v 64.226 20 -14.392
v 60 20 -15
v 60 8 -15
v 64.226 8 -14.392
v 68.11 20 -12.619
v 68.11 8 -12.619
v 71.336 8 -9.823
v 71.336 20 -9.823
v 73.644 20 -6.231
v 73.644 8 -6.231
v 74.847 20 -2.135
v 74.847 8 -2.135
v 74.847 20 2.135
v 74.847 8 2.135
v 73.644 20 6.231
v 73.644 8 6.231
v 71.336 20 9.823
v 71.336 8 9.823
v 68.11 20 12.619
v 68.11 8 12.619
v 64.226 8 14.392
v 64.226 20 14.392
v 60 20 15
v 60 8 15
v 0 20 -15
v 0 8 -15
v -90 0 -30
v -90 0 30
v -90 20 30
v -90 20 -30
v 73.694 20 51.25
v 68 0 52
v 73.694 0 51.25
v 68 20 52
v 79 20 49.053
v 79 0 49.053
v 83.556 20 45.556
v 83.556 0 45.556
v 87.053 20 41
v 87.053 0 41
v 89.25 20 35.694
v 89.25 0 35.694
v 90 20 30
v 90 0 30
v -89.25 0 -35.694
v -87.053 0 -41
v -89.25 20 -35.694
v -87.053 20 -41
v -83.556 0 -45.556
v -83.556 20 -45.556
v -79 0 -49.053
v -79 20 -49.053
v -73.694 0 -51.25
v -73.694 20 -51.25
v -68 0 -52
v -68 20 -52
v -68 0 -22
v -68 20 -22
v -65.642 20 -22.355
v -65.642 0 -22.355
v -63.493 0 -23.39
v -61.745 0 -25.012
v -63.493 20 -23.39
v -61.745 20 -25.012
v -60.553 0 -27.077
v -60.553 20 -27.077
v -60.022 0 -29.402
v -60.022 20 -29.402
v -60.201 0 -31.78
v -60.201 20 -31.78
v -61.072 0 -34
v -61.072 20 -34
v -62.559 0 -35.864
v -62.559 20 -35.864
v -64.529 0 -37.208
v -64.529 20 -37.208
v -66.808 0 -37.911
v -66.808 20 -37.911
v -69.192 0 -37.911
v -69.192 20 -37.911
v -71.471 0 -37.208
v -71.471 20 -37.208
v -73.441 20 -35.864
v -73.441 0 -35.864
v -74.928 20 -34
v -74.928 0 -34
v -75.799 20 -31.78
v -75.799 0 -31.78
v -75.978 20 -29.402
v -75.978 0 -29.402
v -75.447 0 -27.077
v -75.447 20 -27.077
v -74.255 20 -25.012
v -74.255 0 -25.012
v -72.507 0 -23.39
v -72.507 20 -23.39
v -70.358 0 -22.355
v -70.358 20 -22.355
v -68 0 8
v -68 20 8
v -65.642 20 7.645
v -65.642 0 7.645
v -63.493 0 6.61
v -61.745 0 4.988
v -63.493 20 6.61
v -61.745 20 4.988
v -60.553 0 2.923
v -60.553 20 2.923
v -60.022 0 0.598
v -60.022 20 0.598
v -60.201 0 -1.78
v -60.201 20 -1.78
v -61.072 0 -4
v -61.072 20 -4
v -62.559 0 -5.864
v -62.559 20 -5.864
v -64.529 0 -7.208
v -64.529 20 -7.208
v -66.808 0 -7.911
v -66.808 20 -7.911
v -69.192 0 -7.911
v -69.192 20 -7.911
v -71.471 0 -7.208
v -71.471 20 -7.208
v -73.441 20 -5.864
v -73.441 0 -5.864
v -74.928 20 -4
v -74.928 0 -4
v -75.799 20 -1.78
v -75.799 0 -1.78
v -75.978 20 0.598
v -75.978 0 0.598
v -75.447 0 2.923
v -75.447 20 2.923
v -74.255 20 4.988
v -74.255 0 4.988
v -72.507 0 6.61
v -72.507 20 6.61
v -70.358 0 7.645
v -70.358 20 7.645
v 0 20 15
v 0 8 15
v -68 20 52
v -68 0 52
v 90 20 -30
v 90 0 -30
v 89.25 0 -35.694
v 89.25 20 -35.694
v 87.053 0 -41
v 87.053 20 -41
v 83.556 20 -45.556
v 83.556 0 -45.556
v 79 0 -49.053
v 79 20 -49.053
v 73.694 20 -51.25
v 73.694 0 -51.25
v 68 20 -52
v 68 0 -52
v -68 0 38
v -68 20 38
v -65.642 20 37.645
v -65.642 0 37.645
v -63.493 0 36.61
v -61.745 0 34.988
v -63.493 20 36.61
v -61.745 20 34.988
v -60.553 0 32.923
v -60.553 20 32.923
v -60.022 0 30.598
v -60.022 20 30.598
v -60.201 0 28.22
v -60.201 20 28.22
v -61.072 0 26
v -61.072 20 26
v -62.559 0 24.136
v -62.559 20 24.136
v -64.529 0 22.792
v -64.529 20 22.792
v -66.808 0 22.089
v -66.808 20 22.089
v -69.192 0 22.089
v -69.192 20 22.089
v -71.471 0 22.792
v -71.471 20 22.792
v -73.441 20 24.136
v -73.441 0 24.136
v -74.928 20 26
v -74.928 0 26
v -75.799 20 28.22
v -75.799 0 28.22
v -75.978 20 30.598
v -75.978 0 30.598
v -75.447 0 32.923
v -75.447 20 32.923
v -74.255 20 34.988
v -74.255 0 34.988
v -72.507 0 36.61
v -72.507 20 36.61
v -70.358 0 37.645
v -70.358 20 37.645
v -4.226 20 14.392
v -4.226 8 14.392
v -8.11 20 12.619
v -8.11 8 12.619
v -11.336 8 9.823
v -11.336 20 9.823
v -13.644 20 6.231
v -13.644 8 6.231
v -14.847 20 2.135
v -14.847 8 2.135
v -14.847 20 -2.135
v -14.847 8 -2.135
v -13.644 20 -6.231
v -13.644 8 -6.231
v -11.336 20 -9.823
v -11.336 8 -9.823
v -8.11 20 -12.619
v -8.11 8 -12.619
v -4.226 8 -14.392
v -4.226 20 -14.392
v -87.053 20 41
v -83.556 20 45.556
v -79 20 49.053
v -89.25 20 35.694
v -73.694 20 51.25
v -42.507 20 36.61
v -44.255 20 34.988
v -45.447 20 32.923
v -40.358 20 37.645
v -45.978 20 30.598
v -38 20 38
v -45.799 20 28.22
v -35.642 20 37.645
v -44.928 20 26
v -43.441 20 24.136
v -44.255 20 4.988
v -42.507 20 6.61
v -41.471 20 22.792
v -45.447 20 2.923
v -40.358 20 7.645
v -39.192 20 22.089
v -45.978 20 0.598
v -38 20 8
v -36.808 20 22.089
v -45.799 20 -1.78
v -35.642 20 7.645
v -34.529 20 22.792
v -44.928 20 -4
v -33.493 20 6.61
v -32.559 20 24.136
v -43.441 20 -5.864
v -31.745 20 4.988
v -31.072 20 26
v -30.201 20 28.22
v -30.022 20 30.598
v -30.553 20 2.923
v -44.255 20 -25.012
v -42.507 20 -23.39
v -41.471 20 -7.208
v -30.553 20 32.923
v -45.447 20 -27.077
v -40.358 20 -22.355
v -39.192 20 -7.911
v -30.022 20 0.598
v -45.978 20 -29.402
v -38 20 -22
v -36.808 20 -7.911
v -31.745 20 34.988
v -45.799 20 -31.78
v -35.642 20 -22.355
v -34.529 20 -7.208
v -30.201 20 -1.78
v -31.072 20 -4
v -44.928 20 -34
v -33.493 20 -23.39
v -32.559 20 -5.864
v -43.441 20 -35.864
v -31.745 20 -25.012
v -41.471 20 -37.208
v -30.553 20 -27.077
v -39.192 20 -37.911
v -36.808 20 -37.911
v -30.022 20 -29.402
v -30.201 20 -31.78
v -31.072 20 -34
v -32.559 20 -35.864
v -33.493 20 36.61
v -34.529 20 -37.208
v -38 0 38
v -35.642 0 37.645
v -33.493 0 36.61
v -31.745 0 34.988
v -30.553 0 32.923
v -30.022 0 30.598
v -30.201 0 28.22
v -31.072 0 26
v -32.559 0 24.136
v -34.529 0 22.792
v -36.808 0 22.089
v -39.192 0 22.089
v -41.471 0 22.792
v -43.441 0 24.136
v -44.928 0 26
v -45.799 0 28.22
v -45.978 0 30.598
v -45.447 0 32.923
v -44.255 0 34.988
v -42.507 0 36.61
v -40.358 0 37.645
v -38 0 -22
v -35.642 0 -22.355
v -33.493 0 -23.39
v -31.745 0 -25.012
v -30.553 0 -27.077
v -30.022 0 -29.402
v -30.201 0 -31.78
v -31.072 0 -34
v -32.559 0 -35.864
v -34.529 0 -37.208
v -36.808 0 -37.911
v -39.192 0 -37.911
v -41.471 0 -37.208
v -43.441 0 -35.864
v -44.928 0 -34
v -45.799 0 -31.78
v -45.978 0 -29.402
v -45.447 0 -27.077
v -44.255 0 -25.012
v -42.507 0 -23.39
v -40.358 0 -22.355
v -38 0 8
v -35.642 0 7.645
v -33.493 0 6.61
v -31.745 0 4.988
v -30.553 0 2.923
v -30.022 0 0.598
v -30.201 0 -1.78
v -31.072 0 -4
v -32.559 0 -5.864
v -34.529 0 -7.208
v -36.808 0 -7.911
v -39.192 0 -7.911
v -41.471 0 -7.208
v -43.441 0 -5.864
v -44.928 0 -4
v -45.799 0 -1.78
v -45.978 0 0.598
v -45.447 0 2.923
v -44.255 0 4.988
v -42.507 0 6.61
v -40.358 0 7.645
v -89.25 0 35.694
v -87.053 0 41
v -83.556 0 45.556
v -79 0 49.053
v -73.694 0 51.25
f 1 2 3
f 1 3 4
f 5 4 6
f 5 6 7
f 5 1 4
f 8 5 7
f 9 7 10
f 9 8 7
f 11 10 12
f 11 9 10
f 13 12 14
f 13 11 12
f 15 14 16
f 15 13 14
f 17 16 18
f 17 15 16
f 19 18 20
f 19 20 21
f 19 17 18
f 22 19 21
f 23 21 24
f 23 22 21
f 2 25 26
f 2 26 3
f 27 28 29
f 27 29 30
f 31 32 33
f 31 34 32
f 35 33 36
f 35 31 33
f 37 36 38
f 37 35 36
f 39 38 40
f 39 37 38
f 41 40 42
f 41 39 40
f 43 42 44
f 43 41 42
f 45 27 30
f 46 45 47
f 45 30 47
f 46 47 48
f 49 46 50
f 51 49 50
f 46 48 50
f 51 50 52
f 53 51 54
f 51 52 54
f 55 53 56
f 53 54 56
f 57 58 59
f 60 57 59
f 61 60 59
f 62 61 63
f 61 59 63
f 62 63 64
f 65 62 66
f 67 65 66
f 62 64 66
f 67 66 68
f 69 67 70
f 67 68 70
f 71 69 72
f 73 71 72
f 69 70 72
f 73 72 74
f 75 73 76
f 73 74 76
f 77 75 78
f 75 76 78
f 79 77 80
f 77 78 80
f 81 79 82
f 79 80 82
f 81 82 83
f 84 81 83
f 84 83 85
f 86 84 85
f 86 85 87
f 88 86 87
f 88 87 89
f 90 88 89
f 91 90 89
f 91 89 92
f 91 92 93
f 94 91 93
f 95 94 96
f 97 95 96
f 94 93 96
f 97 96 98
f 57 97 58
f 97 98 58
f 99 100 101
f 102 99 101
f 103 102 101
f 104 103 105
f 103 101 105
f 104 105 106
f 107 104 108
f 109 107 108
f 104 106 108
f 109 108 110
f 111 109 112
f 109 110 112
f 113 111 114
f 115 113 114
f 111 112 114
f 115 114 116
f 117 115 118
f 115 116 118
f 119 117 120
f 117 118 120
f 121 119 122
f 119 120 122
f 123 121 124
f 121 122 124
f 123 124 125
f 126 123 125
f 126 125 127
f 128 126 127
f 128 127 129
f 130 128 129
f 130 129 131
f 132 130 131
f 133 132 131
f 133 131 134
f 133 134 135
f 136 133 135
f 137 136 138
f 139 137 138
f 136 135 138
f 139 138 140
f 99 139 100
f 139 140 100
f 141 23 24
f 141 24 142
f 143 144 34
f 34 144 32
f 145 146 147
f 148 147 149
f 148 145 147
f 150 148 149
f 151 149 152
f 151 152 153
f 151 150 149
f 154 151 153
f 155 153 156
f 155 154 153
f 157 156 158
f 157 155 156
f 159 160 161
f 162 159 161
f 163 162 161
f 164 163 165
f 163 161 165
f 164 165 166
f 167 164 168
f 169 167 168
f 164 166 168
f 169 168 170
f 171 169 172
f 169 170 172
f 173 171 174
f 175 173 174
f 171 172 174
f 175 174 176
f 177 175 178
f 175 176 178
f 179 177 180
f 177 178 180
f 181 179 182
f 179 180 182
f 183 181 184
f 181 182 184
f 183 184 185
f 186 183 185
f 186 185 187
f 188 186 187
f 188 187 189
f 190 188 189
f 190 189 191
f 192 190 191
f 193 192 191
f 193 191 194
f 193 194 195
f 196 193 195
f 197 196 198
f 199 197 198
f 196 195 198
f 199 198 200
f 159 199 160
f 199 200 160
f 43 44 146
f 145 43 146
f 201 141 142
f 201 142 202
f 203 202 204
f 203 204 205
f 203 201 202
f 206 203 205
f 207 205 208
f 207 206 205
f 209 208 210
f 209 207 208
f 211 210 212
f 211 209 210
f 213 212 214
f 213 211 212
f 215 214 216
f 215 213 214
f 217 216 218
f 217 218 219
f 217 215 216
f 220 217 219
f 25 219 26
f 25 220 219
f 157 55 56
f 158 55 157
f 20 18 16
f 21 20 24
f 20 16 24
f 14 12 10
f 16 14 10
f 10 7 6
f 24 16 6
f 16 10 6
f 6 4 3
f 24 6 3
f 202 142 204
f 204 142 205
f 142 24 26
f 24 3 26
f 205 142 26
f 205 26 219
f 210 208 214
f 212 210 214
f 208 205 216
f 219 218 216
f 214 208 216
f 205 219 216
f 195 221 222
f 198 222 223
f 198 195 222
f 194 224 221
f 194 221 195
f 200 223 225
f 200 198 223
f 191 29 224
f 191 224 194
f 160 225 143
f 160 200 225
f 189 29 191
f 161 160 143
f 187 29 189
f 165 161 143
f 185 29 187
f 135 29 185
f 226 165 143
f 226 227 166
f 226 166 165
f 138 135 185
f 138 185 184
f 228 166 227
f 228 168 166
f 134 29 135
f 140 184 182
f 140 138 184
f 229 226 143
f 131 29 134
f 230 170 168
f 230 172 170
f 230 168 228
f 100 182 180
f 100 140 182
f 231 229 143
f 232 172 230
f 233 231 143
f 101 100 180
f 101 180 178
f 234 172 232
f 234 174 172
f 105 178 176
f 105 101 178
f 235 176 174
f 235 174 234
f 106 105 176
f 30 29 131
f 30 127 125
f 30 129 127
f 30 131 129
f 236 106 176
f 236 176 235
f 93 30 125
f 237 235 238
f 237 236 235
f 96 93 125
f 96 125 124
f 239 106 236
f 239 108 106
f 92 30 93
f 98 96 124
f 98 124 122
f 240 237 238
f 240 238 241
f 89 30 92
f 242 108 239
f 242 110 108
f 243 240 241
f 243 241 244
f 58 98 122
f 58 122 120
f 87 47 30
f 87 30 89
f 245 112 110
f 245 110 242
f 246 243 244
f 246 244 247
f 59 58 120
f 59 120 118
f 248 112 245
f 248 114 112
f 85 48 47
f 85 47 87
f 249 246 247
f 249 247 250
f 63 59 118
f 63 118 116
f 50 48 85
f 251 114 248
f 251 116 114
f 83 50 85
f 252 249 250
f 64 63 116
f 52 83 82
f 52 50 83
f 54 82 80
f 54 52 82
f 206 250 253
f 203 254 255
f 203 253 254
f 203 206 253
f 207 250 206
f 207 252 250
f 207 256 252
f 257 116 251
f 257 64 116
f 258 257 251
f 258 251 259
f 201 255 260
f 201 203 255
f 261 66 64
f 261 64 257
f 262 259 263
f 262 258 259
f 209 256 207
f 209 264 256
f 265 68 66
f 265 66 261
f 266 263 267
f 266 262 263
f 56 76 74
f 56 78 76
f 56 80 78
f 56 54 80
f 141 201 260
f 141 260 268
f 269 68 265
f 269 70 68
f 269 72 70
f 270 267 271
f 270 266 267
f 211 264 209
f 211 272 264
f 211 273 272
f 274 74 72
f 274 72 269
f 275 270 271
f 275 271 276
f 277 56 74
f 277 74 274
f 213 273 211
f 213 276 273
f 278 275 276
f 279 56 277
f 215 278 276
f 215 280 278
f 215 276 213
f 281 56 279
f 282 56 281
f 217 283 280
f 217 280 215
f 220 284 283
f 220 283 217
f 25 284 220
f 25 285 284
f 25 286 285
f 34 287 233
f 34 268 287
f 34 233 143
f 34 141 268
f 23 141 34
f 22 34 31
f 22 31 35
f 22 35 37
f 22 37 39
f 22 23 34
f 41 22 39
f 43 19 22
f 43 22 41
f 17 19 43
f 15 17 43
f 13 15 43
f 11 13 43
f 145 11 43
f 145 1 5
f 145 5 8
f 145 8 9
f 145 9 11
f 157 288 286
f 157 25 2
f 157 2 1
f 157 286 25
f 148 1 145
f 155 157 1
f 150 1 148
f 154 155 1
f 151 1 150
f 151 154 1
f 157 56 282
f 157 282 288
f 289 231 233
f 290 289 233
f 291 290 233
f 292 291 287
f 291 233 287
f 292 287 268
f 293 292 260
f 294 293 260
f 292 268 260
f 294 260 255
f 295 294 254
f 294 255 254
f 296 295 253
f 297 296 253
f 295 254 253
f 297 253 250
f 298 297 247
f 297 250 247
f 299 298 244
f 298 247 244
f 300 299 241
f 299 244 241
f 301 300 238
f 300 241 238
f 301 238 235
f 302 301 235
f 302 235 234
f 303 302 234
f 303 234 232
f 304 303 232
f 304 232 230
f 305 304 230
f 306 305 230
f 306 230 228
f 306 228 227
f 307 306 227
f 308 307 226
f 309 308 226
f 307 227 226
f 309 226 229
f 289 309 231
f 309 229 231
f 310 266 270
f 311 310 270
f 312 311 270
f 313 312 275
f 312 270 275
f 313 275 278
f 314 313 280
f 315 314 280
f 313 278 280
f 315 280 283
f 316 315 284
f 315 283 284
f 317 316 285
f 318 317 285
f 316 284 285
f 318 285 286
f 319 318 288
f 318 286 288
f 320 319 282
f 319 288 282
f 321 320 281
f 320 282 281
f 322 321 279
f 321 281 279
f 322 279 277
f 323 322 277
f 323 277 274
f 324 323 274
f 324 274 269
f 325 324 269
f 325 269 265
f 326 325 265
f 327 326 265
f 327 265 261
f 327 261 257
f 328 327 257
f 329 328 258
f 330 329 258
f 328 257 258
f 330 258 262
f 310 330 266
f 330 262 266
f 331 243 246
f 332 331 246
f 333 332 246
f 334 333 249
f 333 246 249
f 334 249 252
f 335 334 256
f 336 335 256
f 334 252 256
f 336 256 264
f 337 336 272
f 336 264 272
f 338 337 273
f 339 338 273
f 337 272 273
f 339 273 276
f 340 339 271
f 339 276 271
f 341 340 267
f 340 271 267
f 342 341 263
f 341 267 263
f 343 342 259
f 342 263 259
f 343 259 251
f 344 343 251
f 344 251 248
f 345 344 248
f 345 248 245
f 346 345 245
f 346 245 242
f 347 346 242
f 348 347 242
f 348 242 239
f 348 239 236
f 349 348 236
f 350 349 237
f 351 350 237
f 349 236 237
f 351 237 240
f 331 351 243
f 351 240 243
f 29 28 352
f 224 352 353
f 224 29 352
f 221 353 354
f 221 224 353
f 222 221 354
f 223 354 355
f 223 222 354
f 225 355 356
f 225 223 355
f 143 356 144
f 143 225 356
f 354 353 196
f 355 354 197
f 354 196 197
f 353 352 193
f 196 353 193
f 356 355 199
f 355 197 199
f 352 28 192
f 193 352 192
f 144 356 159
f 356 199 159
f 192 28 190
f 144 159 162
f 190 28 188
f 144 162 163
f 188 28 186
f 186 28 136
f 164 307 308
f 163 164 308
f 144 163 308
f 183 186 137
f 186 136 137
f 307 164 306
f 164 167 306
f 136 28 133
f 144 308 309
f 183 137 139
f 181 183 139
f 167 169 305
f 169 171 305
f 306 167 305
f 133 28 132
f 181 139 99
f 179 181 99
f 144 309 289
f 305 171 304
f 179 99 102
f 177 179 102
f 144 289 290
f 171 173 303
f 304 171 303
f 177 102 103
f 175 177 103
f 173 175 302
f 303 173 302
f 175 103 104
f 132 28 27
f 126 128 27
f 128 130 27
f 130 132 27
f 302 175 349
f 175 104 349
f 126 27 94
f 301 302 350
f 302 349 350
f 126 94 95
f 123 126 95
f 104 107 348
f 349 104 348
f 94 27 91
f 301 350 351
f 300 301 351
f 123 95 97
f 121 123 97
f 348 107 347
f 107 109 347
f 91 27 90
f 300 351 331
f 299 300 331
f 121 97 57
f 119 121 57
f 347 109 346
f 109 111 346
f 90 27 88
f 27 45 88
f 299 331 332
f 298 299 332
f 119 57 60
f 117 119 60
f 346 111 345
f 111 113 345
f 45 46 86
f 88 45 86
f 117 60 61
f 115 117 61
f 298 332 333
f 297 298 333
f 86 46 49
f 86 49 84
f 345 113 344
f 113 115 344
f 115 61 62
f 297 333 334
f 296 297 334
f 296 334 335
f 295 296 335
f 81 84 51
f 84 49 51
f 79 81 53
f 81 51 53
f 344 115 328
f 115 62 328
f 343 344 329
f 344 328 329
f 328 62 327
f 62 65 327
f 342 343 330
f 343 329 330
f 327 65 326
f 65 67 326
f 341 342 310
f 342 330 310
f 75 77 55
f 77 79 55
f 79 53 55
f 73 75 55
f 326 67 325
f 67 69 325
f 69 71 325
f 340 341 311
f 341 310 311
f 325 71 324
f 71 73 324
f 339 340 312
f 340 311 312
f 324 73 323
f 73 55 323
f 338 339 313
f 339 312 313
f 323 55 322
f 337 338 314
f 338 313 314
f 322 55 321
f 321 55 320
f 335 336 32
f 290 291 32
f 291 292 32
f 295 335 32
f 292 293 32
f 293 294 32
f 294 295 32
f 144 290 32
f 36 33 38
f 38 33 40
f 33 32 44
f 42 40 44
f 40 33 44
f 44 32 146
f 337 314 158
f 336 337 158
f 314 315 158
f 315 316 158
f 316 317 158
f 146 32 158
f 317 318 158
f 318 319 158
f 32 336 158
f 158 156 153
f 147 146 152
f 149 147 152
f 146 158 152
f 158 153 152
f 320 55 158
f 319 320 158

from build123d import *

# Parameters (mm, degrees)
SKETCH1_W           = 180
SKETCH1_H           = 104
BOSS_EXTRUDE1_DEPTH = 20
FILLET1_R           = 22
SKETCH3_R           = 8
CUT_EXTRUDE1_DEPTH  = 20
CUT_EXTRUDE2_DEPTH  = 12


with BuildPart() as part:
    # Sketch1 → Boss-Extrude1 (new body)
    with BuildSketch(Plane(origin=(0, 0, 0), x_dir=(1, 0, 0), z_dir=(0, 1, 0))):
        Rectangle(SKETCH1_W, SKETCH1_H)
    extrude(amount=BOSS_EXTRUDE1_DEPTH)

    # Fillet1
    fillet1_edges = [part.edges().sort_by_distance(p)[0] for p in [
        (90, 10, 52),
        (-90, 10, 52),
        (-90, 10, -52),
        (90, 10, -52),
    ]]
    fillet(fillet1_edges, radius=FILLET1_R)

    # Sketch3 → Cut-Extrude1 (cut)
    with BuildSketch(Plane(origin=(0, 20, 0), x_dir=(1, 0, 0), z_dir=(0, 1, 0))):
        with Locations(Location((-68, 30, 0), (0, 0, 270))):
            Circle(SKETCH3_R)
        with Locations(Location((-68, 0, 0), (0, 0, 270))):
            Circle(SKETCH3_R)
        with Locations(Location((-68, -30, 0), (0, 0, 270))):
            Circle(SKETCH3_R)
        with Locations(Location((-38, -30, 0), (0, 0, 270))):
            Circle(SKETCH3_R)
        with Locations(Location((-38, 0, 0), (0, 0, 270))):
            Circle(SKETCH3_R)
        with Locations(Location((-38, 30, 0), (0, 0, 270))):
            Circle(SKETCH3_R)
    extrude(amount=-CUT_EXTRUDE1_DEPTH, mode=Mode.SUBTRACT)

    # Sketch4 → Cut-Extrude2 (cut)
    with BuildSketch(Plane(origin=(0, 20, 0), x_dir=(1, 0, 0), z_dir=(0, 1, 0))):
        with BuildLine():
            Line((0, 15), (60, 15))
            ThreePointArc((60, 15), (75, 0), (60, -15))
            Line((60, -15), (0, -15))
            ThreePointArc((0, -15), (-15, 0), (0, 15))
        make_face()
    extrude(amount=-CUT_EXTRUDE2_DEPTH, mode=Mode.SUBTRACT)


solid = part.part
